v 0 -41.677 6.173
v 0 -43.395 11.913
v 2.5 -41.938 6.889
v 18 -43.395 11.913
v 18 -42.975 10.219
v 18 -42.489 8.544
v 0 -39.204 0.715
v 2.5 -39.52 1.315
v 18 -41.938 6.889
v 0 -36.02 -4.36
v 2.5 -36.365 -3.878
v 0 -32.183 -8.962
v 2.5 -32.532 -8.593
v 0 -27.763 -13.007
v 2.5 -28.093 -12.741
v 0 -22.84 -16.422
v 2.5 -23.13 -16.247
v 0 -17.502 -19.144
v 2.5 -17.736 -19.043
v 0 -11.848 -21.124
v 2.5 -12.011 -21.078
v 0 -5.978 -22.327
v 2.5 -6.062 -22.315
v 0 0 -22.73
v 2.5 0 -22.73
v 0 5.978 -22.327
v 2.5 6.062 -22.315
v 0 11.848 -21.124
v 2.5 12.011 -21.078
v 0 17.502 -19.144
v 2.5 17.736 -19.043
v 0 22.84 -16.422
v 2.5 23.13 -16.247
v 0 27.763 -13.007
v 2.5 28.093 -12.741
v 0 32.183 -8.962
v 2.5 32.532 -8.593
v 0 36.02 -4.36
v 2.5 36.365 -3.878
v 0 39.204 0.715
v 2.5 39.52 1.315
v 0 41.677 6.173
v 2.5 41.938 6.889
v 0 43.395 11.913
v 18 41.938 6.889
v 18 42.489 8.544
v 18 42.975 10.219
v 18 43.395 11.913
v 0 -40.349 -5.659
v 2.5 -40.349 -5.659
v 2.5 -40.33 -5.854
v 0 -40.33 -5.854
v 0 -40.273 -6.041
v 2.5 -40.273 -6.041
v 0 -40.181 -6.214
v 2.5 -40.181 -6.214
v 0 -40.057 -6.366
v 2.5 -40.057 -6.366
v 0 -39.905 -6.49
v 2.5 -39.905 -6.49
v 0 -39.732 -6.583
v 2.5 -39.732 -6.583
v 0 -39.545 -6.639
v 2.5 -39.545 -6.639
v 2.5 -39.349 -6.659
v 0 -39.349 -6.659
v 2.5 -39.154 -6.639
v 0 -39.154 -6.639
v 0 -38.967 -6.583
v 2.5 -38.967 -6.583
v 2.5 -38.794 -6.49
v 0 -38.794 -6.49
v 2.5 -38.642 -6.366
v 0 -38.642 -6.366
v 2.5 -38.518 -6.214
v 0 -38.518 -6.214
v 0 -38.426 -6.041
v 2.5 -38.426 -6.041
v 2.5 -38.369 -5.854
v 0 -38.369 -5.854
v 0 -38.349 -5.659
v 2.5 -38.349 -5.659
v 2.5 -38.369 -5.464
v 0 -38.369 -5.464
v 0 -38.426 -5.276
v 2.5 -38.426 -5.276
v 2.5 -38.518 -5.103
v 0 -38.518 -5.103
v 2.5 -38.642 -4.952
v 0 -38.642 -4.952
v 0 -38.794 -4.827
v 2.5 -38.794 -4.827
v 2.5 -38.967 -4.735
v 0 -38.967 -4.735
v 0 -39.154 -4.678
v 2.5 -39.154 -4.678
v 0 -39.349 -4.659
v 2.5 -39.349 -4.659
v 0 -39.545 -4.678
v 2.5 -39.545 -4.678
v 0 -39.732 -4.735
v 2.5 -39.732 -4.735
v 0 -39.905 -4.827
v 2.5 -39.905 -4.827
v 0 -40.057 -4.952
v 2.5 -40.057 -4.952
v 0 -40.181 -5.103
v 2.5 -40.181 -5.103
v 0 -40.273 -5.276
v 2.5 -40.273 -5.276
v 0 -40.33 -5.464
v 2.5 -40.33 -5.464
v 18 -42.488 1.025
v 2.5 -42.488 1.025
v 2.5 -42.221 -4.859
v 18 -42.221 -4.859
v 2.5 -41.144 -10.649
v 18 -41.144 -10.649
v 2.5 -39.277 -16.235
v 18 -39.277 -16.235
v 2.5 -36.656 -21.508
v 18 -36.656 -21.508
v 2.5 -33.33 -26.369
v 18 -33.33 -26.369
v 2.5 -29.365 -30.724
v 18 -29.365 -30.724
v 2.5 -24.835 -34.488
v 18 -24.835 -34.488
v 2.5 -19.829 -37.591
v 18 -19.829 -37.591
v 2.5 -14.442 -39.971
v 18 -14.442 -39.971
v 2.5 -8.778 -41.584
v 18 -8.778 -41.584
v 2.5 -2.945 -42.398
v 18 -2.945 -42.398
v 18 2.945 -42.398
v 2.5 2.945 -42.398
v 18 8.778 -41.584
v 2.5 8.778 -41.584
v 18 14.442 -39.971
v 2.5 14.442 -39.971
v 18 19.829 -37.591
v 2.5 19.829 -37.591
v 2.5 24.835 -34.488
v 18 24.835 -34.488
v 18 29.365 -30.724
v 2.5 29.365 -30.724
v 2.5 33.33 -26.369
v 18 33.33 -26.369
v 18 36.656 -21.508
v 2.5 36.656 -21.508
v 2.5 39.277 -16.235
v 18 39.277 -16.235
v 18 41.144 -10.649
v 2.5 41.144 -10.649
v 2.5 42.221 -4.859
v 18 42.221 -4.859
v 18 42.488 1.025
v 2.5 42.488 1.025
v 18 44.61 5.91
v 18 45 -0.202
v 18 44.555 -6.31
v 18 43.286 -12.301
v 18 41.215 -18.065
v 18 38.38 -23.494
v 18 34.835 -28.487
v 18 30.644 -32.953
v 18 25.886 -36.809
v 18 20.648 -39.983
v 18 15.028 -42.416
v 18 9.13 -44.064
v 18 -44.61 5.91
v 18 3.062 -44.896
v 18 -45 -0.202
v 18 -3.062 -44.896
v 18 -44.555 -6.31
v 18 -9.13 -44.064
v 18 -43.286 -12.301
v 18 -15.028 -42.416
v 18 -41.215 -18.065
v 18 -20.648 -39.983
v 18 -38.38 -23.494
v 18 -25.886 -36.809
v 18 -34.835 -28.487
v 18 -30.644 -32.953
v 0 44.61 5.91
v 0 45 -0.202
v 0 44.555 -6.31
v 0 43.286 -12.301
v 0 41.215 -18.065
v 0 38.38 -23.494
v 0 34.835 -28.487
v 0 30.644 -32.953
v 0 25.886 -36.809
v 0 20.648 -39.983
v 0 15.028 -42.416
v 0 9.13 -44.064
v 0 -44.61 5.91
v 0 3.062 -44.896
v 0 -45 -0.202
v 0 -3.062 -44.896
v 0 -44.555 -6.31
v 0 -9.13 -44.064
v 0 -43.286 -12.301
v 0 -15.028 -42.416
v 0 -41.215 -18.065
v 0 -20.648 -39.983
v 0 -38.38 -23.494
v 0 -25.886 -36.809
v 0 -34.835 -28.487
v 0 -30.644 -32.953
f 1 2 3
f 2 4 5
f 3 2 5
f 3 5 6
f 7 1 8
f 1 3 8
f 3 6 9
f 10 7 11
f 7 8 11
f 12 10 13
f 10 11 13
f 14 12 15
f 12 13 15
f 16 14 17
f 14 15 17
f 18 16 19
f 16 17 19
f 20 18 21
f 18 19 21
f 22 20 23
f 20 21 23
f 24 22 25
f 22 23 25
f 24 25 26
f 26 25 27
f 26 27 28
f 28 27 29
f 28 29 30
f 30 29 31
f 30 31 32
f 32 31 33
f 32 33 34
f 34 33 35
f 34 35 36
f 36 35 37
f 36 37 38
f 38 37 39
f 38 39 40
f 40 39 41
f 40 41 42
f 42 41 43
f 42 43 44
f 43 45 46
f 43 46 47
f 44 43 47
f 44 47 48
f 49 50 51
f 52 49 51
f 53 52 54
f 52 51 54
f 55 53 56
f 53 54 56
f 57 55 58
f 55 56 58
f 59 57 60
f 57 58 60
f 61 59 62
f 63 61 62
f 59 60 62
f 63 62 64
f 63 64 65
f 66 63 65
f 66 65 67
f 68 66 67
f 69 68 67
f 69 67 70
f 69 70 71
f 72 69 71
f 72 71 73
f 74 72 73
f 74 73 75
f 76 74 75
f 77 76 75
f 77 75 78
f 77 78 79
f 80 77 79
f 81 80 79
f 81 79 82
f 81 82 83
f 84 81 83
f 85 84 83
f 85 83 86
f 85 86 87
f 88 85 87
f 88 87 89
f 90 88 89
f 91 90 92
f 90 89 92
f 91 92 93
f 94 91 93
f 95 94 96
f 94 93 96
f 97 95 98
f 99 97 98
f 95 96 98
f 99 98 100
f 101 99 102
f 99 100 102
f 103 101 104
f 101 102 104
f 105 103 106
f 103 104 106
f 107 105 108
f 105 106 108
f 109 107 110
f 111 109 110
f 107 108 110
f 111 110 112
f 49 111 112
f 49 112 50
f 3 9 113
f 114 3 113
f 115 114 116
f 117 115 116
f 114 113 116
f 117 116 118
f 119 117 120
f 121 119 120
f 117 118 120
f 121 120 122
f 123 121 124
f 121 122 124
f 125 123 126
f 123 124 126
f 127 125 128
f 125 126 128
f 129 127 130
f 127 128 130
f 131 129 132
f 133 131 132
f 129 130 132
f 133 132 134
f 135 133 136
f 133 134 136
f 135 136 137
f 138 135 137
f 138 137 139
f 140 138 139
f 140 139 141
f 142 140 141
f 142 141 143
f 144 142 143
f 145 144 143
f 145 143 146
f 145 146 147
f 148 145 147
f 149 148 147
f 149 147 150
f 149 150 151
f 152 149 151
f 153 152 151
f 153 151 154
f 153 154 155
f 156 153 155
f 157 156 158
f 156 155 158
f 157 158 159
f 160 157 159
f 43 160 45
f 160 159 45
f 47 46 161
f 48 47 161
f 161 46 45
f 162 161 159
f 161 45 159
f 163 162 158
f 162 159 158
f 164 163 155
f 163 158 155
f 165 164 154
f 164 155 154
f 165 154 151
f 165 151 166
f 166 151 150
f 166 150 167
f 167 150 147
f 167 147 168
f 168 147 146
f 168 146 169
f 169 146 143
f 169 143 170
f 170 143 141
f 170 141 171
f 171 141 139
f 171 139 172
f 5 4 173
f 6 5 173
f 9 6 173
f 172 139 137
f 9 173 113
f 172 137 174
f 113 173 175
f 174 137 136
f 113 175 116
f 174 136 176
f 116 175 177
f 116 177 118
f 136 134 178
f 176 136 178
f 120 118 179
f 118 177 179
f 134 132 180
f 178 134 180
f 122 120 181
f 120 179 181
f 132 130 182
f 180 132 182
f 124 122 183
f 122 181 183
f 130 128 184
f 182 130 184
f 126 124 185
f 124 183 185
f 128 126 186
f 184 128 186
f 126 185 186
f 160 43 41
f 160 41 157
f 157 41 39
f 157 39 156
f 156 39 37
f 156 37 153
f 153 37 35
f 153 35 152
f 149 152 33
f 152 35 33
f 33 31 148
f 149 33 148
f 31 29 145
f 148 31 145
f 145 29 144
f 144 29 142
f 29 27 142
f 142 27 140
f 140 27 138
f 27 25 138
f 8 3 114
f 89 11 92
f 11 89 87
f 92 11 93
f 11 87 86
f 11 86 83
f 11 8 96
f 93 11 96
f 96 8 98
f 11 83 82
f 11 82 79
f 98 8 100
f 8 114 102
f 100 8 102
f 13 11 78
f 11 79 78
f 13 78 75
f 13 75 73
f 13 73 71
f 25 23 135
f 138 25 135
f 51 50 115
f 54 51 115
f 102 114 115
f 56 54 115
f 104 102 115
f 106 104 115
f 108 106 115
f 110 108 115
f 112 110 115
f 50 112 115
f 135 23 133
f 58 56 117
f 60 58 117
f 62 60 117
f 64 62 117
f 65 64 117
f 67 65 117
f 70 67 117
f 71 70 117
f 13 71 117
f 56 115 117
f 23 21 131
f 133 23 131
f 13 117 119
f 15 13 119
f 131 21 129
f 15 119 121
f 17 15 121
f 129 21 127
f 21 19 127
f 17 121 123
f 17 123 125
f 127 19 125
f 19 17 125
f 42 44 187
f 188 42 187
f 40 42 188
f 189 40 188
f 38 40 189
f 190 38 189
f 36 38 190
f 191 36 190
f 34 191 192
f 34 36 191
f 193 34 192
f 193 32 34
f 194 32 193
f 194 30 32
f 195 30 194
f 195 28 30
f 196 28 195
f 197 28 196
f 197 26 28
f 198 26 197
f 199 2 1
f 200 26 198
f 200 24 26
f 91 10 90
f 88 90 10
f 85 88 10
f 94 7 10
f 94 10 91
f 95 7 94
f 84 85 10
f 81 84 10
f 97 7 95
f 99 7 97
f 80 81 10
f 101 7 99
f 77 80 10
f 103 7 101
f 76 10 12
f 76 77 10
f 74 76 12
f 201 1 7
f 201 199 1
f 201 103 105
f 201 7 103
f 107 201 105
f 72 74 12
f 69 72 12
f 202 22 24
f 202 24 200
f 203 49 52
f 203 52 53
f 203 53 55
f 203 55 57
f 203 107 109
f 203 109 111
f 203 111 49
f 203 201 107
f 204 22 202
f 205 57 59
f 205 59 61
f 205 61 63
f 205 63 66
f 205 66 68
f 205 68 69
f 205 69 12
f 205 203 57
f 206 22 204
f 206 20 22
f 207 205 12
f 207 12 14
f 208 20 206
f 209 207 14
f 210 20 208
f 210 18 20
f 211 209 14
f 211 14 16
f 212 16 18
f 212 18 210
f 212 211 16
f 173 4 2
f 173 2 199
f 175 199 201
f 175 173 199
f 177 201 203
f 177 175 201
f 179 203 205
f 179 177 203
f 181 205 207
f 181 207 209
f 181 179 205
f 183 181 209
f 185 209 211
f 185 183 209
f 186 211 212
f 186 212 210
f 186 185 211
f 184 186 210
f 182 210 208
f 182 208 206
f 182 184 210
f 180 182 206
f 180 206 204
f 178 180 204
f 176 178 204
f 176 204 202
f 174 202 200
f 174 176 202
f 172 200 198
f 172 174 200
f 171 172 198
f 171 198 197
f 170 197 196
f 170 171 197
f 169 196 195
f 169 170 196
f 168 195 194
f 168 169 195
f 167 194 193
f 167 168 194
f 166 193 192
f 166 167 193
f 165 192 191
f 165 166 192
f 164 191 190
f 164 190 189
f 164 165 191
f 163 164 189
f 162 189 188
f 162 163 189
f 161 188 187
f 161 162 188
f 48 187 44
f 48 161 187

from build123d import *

# Parameters (mm, degrees)
F0_W = 18
F0_H = 45
F3_D = 6
F5_T = -2.5
F6_D = 89
F8_D = 2


with BuildPart() as f1:
    # F0 (on Front) → F1 (revolve)
    with BuildSketch(Plane.XZ):
        with Locations((9, 22.5)):
            Rectangle(F0_W, F0_H)
    revolve(axis=Axis((9, 0, 0), (1, 0, 0)))

    # F3 (through all)
    with Locations(Plane(origin=(0, 0, 0), x_dir=(0, 1, 0), z_dir=(-1, 0, 0))):
        with Locations((0, 0)):
            Hole(F3_D / 2)

    # F5
    f5_openings = [f1.faces().sort_by_distance(p)[0] for p in [
        (18, 0, -43.727208),
    ]]
    offset(amount=F5_T, openings=f5_openings)

    # F6 (through all)
    with Locations(Plane(origin=(0, 0, 0), x_dir=(0, 1, 0), z_dir=(-1, 0, 0))):
        with Locations((0, -21.7700034969)):
            Hole(F6_D / 2)

    # F8 (through all)
    with Locations(Plane(origin=(0, 0, 0), x_dir=(0, 1, 0), z_dir=(-1, 0, 0))):
        with Locations((-39.3494814634, 5.6586829014)):
            Hole(F8_D / 2)


solid = f1.part
